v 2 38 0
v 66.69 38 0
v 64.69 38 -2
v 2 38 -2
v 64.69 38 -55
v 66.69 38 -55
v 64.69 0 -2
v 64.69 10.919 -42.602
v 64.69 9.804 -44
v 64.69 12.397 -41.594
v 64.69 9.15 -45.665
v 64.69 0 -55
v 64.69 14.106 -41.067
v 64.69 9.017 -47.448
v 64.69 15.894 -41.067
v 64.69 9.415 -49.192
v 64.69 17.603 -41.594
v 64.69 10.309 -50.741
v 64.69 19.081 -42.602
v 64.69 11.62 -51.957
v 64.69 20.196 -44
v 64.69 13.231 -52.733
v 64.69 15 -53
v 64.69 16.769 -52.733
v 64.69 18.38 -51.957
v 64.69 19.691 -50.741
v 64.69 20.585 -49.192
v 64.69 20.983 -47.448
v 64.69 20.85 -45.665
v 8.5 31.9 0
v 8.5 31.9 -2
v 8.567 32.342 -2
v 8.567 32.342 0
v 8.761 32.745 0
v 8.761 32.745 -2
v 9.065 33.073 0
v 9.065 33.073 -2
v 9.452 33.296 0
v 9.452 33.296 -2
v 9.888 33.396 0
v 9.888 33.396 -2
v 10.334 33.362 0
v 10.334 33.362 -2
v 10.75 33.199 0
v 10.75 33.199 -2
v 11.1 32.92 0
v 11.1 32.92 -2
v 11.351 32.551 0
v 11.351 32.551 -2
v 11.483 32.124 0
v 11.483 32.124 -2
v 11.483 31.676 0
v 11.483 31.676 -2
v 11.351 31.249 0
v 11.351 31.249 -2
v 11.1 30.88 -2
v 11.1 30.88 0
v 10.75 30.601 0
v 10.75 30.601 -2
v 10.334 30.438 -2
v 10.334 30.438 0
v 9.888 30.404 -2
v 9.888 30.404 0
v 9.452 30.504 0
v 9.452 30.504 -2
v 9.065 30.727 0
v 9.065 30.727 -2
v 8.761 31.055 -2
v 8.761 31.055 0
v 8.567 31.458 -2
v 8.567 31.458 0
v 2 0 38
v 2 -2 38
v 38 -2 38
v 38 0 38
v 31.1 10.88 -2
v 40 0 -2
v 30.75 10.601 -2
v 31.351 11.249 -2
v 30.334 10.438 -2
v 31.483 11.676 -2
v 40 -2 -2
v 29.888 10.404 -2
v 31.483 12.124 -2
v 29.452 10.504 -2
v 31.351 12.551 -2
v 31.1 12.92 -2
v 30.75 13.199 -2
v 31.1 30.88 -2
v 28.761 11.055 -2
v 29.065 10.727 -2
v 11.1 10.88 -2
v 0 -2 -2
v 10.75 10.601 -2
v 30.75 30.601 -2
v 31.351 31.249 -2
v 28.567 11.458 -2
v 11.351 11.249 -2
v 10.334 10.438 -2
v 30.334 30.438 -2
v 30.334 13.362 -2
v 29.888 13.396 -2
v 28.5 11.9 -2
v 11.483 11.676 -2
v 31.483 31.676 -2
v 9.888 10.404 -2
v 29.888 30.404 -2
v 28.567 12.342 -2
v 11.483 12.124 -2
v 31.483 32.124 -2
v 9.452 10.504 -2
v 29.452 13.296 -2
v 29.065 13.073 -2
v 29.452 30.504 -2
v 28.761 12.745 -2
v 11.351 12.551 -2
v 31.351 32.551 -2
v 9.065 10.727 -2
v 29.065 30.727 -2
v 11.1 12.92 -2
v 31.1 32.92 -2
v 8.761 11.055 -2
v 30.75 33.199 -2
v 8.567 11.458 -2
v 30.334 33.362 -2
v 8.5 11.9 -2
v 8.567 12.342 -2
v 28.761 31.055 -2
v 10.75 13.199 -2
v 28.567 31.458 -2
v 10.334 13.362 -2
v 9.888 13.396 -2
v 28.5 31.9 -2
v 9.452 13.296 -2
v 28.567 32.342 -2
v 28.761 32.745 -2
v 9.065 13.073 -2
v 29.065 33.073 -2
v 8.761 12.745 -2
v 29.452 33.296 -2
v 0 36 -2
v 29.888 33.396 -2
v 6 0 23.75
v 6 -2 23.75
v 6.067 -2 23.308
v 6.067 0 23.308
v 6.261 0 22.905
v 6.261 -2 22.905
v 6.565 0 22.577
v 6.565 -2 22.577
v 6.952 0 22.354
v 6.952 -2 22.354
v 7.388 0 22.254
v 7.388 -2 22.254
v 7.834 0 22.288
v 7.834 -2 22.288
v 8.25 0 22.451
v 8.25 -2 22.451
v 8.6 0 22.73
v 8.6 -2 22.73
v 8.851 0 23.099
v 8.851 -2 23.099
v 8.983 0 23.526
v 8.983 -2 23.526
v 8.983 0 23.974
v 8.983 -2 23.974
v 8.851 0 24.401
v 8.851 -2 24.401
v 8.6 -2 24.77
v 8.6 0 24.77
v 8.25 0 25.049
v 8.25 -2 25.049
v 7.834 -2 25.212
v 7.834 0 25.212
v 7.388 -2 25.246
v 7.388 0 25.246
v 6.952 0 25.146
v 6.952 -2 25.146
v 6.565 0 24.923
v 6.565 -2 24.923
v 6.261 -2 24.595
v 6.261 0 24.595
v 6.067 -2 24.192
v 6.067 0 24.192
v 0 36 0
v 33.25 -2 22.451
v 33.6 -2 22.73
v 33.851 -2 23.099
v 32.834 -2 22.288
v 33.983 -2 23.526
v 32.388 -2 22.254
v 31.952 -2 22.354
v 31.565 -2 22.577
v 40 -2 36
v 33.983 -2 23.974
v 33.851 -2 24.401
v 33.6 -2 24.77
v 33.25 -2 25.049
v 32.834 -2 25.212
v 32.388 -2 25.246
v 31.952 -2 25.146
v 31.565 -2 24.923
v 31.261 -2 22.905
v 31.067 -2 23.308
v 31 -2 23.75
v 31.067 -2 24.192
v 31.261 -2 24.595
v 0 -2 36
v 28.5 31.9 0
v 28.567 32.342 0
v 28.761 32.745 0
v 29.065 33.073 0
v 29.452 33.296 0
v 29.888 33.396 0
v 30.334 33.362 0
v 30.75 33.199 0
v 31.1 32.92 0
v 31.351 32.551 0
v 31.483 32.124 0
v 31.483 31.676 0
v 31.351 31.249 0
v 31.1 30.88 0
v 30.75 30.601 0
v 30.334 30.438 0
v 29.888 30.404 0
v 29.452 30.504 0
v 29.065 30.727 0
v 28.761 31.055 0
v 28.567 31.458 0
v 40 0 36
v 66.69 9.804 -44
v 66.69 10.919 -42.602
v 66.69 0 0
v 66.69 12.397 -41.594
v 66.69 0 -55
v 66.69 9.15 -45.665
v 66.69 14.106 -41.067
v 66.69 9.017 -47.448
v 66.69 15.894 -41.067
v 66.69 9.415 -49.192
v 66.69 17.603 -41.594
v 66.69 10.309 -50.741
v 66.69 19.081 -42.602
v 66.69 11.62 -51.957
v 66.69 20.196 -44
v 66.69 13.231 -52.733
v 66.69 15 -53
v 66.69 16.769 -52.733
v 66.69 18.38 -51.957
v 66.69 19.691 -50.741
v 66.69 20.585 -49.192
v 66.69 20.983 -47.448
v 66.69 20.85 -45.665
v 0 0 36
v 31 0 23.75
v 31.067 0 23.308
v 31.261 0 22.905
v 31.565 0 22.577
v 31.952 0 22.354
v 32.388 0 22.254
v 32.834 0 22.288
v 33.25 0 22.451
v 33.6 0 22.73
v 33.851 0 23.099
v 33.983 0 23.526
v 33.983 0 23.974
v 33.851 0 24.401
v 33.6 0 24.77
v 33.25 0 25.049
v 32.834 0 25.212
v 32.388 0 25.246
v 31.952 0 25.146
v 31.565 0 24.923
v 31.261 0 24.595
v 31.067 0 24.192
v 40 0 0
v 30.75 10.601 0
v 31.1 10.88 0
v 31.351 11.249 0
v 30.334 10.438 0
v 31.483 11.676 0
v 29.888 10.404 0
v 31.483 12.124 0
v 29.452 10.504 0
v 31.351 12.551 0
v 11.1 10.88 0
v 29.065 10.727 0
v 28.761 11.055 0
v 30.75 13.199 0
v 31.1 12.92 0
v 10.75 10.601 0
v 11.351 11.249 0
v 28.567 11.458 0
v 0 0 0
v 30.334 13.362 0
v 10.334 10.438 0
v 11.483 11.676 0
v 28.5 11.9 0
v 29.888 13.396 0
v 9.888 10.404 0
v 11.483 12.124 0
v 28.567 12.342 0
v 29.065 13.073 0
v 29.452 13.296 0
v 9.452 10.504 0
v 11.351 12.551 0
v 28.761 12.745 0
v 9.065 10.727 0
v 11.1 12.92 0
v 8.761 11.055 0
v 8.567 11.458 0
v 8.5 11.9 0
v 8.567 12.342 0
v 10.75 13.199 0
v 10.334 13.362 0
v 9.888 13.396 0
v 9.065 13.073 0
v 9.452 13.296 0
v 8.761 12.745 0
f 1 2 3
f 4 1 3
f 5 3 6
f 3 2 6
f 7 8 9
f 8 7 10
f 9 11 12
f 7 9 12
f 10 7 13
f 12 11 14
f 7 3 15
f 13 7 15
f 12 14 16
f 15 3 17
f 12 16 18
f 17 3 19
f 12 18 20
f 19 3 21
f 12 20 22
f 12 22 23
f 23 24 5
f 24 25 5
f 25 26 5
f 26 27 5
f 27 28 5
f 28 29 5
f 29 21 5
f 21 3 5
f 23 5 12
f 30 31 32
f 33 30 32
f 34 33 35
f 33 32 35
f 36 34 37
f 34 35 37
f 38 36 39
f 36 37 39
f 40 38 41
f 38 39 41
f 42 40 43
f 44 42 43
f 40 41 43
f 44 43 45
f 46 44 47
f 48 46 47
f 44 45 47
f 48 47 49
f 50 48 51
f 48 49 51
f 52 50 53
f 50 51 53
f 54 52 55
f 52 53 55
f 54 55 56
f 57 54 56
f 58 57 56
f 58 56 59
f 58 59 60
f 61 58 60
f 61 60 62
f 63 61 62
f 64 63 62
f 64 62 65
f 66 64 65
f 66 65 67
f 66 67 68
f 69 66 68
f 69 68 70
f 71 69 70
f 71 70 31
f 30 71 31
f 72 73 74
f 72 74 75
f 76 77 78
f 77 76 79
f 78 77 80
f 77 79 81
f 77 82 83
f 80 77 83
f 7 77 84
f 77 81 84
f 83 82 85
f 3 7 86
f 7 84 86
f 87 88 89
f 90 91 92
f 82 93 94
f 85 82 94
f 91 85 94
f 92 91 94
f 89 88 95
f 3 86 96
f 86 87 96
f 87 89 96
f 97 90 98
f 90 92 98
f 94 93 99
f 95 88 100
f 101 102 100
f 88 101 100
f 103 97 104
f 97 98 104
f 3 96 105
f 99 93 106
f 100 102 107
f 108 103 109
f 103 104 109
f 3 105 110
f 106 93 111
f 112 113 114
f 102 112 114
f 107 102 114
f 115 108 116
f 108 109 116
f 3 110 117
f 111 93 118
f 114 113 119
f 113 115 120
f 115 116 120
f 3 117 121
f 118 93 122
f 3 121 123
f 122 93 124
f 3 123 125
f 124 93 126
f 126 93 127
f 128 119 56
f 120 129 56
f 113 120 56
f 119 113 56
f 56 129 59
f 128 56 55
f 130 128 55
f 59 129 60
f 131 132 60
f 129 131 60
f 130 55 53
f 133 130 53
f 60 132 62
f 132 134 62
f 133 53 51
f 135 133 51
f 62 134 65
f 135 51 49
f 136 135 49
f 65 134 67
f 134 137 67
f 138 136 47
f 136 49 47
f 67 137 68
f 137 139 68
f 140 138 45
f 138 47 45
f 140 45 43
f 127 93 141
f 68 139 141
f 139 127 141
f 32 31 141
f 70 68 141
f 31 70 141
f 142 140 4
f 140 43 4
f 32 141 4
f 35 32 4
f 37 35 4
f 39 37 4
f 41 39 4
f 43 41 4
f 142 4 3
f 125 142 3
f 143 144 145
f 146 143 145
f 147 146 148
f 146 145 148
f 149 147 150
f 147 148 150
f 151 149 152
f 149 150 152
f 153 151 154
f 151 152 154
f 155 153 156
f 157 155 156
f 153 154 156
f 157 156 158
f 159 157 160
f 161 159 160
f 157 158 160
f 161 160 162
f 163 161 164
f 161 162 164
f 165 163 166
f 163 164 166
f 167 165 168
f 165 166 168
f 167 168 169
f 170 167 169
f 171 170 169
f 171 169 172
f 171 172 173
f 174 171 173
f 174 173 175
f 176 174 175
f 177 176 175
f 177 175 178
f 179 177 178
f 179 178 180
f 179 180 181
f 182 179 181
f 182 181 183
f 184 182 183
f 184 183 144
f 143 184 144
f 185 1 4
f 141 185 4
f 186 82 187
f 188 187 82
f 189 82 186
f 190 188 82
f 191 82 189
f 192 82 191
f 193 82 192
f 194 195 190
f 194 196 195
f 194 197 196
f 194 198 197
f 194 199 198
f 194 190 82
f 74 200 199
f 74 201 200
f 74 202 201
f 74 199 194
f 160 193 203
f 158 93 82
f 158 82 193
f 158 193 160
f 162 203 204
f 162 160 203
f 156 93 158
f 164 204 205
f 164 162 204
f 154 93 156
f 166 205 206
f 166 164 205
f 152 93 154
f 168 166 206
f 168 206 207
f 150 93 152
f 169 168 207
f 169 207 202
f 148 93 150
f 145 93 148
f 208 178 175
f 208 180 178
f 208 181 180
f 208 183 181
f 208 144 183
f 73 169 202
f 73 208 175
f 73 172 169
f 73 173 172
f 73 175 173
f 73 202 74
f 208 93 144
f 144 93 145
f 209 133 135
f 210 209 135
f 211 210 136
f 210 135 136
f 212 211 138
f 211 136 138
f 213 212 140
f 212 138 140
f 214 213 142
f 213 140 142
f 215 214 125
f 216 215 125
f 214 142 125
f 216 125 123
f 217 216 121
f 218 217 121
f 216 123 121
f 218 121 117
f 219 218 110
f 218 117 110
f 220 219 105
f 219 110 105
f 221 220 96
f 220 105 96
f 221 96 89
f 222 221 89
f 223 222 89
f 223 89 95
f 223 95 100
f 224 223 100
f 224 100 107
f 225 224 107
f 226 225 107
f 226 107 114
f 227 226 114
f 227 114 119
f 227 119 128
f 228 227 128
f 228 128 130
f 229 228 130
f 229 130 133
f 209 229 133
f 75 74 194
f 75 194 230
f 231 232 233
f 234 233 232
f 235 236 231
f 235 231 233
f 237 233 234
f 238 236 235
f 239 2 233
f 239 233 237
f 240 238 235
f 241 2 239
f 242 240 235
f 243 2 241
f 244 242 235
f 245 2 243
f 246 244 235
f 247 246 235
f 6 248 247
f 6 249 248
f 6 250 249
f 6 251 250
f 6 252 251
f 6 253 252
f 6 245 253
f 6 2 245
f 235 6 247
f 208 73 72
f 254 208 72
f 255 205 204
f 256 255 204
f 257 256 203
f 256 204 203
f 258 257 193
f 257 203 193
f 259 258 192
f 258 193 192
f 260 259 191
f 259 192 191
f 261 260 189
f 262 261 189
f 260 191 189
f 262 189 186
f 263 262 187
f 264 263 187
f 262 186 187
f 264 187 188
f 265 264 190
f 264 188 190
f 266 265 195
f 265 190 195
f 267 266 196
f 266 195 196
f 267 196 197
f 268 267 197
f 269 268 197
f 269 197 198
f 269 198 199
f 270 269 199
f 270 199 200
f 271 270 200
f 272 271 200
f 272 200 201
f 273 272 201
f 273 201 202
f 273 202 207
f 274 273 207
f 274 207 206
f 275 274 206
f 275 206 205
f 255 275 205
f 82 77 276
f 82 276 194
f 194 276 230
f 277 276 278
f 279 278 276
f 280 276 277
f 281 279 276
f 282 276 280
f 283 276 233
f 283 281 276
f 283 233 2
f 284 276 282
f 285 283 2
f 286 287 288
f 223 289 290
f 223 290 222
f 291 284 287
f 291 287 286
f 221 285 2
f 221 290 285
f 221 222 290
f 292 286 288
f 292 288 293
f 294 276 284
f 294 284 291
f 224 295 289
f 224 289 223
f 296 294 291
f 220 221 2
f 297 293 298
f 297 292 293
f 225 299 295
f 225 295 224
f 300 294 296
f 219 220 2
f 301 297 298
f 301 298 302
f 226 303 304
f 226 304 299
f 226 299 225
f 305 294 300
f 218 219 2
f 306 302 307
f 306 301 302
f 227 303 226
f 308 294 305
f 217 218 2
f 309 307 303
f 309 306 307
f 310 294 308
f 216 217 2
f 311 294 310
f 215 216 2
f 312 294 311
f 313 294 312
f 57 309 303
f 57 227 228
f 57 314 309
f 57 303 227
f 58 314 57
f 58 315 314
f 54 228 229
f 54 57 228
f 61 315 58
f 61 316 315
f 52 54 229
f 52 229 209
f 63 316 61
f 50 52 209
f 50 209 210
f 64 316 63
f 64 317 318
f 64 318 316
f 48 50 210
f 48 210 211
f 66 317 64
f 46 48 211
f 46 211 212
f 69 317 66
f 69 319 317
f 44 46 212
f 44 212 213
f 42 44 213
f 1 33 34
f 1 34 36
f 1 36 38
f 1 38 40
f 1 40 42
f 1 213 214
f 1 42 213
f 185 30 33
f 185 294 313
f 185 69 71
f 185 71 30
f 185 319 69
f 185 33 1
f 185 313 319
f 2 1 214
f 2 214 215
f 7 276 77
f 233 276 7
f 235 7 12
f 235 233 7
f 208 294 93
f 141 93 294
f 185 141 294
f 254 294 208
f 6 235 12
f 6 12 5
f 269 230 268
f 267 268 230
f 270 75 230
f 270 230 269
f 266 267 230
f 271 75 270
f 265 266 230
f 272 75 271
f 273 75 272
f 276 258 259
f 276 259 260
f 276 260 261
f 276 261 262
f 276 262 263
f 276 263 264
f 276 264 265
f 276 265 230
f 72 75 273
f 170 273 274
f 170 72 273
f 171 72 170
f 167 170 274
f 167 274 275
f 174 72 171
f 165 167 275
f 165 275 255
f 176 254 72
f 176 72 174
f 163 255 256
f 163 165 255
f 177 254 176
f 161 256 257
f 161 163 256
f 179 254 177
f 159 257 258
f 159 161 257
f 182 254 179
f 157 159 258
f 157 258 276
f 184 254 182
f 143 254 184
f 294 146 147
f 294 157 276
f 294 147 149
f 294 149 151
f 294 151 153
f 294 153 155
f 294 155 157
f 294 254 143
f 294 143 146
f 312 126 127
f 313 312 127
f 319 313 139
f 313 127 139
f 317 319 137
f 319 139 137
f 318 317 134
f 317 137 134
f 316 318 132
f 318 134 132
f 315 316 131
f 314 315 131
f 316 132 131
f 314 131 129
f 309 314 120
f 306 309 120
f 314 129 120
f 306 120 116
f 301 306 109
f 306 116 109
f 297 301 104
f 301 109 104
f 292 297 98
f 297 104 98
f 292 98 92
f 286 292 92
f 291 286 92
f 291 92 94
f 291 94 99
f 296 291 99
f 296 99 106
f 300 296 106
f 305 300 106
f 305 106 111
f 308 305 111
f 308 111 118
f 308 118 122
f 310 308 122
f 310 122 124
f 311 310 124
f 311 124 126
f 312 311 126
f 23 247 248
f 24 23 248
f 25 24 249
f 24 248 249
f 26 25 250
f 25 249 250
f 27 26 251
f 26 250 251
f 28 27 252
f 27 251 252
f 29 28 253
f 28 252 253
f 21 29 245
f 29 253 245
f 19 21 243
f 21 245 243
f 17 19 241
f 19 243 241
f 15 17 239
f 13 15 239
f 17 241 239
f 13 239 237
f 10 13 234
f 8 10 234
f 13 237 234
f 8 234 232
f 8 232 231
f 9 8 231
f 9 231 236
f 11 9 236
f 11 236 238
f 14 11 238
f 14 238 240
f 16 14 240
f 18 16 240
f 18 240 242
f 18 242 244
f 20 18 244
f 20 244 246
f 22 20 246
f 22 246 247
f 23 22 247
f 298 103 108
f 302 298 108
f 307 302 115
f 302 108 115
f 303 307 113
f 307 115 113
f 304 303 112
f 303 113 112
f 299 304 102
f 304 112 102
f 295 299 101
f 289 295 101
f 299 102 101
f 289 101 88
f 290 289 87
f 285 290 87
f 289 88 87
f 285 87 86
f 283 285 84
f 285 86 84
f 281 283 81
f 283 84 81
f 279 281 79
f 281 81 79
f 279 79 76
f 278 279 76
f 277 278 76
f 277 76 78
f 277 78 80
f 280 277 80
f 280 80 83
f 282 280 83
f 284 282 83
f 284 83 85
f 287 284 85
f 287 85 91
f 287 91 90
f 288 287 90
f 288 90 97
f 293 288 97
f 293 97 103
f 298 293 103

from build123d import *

# Parameters (mm, degrees)
EXTRUDE1_DEPTH           = 40
EXTRUDE2_REACH           = 42
SKETCH2_R                = 1.5
EXTRUDE3_REACH           = 42
SKETCH3_R                = 1.5
CHAMFER1_SIZE            = 2
SKETCH4_W                = 2
SKETCH4_H                = 38
BOSS_EXTRUDE1_DEPTH      = 26.69
BOSS_EXTRUDE1_DEPTH_BACK = 3
SKETCH5_W                = 53
SKETCH5_H                = 38
BOSS_EXTRUDE2_DEPTH      = 2
SKETCH6_R                = 6
CUT_EXTRUDE1_DEPTH       = 3


with BuildPart() as part:
    # Sketch1 → Extrude1 (new body)
    with BuildSketch(Plane(origin=(0, 0, 0), x_dir=(0, 0, -1), z_dir=(1, 0, 0))):
        Polygon((0, 0), (0, 38), (2, 38), (2, -2), (-38, -2), (-38, 0), align=None)
    extrude(amount=EXTRUDE1_DEPTH)

    # Sketch2 → Extrude2 (cut, up to next)
    with BuildSketch(Plane(origin=(0, -2, 0), x_dir=(-1, 0, 0), z_dir=(0, -1, 0)), mode=Mode.PRIVATE) as extrude2_sk1:
        with Locations((-32.5, -23.75)):
            Circle(SKETCH2_R)
    extrude2_tool1 = extrude(extrude2_sk1.sketch, amount=-EXTRUDE2_REACH, mode=Mode.PRIVATE) & part.part
    add(extrude2_tool1.solids().sort_by_distance((32.5, -2, 23.75))[0], mode=Mode.SUBTRACT)
    # Sketch2 → Extrude2 (cut, up to next)
    with BuildSketch(Plane(origin=(0, -2, 0), x_dir=(-1, 0, 0), z_dir=(0, -1, 0)), mode=Mode.PRIVATE) as extrude2_sk2:
        with Locations((-7.5, -23.75)):
            Circle(SKETCH2_R)
    extrude2_tool2 = extrude(extrude2_sk2.sketch, amount=-EXTRUDE2_REACH, mode=Mode.PRIVATE) & part.part
    add(extrude2_tool2.solids().sort_by_distance((7.5, -2, 23.75))[0], mode=Mode.SUBTRACT)

    # Sketch3 → Extrude3 (cut, up to next)
    with BuildSketch(Plane(origin=(0, 0, -2), x_dir=(-1, 0, 0), z_dir=(0, 0, -1)), mode=Mode.PRIVATE) as extrude3_sk1:
        with Locations((-10, 31.9)):
            Circle(SKETCH3_R)
    extrude3_tool1 = extrude(extrude3_sk1.sketch, amount=-EXTRUDE3_REACH, mode=Mode.PRIVATE) & part.part
    add(extrude3_tool1.solids().sort_by_distance((10, 31.9, -2))[0], mode=Mode.SUBTRACT)
    # Sketch3 → Extrude3 (cut, up to next)
    with BuildSketch(Plane(origin=(0, 0, -2), x_dir=(-1, 0, 0), z_dir=(0, 0, -1)), mode=Mode.PRIVATE) as extrude3_sk2:
        with Locations((-30, 31.9)):
            Circle(SKETCH3_R)
    extrude3_tool2 = extrude(extrude3_sk2.sketch, amount=-EXTRUDE3_REACH, mode=Mode.PRIVATE) & part.part
    add(extrude3_tool2.solids().sort_by_distance((30, 31.9, -2))[0], mode=Mode.SUBTRACT)
    # Sketch3 → Extrude3 (cut, up to next)
    with BuildSketch(Plane(origin=(0, 0, -2), x_dir=(-1, 0, 0), z_dir=(0, 0, -1)), mode=Mode.PRIVATE) as extrude3_sk3:
        with Locations((-30, 11.9)):
            Circle(SKETCH3_R)
    extrude3_tool3 = extrude(extrude3_sk3.sketch, amount=-EXTRUDE3_REACH, mode=Mode.PRIVATE) & part.part
    add(extrude3_tool3.solids().sort_by_distance((30, 11.9, -2))[0], mode=Mode.SUBTRACT)
    # Sketch3 → Extrude3 (cut, up to next)
    with BuildSketch(Plane(origin=(0, 0, -2), x_dir=(-1, 0, 0), z_dir=(0, 0, -1)), mode=Mode.PRIVATE) as extrude3_sk4:
        with Locations((-10, 11.9)):
            Circle(SKETCH3_R)
    extrude3_tool4 = extrude(extrude3_sk4.sketch, amount=-EXTRUDE3_REACH, mode=Mode.PRIVATE) & part.part
    add(extrude3_tool4.solids().sort_by_distance((10, 11.9, -2))[0], mode=Mode.SUBTRACT)

    # Chamfer1
    chamfer1_edges = [part.edges().sort_by_distance(p)[0] for p in [
        (40, 38, -1),
        (0, 38, -1),
        (40, -1, 38),
        (0, -1, 38),
    ]]
    chamfer(chamfer1_edges, length=CHAMFER1_SIZE)

    # Sketch4 → Boss-Extrude1 (add, two sides)
    with BuildSketch(Plane(origin=(40, 0, 0), x_dir=(0, 0, -1), z_dir=(1, 0, 0))) as boss_extrude1_sk:
        with Locations((1, 19)):
            Rectangle(SKETCH4_W, SKETCH4_H)
    extrude(amount=BOSS_EXTRUDE1_DEPTH)
    extrude(boss_extrude1_sk.sketch, amount=-BOSS_EXTRUDE1_DEPTH_BACK)

    # Sketch5 → Boss-Extrude2 (add)
    with BuildSketch(Plane(origin=(66.69, 0, 0), x_dir=(0, 0, -1), z_dir=(1, 0, 0))):
        with Locations((28.5, 19)):
            Rectangle(SKETCH5_W, SKETCH5_H)
    extrude(amount=-BOSS_EXTRUDE2_DEPTH)

    # Sketch6 → Cut-Extrude1 (cut)
    with BuildSketch(Plane(origin=(66.69, 0, 0), x_dir=(0, 0, -1), z_dir=(1, 0, 0))):
        with Locations((47, 15)):
            Circle(SKETCH6_R)
    extrude(amount=-CUT_EXTRUDE1_DEPTH, mode=Mode.SUBTRACT)


solid = part.part
